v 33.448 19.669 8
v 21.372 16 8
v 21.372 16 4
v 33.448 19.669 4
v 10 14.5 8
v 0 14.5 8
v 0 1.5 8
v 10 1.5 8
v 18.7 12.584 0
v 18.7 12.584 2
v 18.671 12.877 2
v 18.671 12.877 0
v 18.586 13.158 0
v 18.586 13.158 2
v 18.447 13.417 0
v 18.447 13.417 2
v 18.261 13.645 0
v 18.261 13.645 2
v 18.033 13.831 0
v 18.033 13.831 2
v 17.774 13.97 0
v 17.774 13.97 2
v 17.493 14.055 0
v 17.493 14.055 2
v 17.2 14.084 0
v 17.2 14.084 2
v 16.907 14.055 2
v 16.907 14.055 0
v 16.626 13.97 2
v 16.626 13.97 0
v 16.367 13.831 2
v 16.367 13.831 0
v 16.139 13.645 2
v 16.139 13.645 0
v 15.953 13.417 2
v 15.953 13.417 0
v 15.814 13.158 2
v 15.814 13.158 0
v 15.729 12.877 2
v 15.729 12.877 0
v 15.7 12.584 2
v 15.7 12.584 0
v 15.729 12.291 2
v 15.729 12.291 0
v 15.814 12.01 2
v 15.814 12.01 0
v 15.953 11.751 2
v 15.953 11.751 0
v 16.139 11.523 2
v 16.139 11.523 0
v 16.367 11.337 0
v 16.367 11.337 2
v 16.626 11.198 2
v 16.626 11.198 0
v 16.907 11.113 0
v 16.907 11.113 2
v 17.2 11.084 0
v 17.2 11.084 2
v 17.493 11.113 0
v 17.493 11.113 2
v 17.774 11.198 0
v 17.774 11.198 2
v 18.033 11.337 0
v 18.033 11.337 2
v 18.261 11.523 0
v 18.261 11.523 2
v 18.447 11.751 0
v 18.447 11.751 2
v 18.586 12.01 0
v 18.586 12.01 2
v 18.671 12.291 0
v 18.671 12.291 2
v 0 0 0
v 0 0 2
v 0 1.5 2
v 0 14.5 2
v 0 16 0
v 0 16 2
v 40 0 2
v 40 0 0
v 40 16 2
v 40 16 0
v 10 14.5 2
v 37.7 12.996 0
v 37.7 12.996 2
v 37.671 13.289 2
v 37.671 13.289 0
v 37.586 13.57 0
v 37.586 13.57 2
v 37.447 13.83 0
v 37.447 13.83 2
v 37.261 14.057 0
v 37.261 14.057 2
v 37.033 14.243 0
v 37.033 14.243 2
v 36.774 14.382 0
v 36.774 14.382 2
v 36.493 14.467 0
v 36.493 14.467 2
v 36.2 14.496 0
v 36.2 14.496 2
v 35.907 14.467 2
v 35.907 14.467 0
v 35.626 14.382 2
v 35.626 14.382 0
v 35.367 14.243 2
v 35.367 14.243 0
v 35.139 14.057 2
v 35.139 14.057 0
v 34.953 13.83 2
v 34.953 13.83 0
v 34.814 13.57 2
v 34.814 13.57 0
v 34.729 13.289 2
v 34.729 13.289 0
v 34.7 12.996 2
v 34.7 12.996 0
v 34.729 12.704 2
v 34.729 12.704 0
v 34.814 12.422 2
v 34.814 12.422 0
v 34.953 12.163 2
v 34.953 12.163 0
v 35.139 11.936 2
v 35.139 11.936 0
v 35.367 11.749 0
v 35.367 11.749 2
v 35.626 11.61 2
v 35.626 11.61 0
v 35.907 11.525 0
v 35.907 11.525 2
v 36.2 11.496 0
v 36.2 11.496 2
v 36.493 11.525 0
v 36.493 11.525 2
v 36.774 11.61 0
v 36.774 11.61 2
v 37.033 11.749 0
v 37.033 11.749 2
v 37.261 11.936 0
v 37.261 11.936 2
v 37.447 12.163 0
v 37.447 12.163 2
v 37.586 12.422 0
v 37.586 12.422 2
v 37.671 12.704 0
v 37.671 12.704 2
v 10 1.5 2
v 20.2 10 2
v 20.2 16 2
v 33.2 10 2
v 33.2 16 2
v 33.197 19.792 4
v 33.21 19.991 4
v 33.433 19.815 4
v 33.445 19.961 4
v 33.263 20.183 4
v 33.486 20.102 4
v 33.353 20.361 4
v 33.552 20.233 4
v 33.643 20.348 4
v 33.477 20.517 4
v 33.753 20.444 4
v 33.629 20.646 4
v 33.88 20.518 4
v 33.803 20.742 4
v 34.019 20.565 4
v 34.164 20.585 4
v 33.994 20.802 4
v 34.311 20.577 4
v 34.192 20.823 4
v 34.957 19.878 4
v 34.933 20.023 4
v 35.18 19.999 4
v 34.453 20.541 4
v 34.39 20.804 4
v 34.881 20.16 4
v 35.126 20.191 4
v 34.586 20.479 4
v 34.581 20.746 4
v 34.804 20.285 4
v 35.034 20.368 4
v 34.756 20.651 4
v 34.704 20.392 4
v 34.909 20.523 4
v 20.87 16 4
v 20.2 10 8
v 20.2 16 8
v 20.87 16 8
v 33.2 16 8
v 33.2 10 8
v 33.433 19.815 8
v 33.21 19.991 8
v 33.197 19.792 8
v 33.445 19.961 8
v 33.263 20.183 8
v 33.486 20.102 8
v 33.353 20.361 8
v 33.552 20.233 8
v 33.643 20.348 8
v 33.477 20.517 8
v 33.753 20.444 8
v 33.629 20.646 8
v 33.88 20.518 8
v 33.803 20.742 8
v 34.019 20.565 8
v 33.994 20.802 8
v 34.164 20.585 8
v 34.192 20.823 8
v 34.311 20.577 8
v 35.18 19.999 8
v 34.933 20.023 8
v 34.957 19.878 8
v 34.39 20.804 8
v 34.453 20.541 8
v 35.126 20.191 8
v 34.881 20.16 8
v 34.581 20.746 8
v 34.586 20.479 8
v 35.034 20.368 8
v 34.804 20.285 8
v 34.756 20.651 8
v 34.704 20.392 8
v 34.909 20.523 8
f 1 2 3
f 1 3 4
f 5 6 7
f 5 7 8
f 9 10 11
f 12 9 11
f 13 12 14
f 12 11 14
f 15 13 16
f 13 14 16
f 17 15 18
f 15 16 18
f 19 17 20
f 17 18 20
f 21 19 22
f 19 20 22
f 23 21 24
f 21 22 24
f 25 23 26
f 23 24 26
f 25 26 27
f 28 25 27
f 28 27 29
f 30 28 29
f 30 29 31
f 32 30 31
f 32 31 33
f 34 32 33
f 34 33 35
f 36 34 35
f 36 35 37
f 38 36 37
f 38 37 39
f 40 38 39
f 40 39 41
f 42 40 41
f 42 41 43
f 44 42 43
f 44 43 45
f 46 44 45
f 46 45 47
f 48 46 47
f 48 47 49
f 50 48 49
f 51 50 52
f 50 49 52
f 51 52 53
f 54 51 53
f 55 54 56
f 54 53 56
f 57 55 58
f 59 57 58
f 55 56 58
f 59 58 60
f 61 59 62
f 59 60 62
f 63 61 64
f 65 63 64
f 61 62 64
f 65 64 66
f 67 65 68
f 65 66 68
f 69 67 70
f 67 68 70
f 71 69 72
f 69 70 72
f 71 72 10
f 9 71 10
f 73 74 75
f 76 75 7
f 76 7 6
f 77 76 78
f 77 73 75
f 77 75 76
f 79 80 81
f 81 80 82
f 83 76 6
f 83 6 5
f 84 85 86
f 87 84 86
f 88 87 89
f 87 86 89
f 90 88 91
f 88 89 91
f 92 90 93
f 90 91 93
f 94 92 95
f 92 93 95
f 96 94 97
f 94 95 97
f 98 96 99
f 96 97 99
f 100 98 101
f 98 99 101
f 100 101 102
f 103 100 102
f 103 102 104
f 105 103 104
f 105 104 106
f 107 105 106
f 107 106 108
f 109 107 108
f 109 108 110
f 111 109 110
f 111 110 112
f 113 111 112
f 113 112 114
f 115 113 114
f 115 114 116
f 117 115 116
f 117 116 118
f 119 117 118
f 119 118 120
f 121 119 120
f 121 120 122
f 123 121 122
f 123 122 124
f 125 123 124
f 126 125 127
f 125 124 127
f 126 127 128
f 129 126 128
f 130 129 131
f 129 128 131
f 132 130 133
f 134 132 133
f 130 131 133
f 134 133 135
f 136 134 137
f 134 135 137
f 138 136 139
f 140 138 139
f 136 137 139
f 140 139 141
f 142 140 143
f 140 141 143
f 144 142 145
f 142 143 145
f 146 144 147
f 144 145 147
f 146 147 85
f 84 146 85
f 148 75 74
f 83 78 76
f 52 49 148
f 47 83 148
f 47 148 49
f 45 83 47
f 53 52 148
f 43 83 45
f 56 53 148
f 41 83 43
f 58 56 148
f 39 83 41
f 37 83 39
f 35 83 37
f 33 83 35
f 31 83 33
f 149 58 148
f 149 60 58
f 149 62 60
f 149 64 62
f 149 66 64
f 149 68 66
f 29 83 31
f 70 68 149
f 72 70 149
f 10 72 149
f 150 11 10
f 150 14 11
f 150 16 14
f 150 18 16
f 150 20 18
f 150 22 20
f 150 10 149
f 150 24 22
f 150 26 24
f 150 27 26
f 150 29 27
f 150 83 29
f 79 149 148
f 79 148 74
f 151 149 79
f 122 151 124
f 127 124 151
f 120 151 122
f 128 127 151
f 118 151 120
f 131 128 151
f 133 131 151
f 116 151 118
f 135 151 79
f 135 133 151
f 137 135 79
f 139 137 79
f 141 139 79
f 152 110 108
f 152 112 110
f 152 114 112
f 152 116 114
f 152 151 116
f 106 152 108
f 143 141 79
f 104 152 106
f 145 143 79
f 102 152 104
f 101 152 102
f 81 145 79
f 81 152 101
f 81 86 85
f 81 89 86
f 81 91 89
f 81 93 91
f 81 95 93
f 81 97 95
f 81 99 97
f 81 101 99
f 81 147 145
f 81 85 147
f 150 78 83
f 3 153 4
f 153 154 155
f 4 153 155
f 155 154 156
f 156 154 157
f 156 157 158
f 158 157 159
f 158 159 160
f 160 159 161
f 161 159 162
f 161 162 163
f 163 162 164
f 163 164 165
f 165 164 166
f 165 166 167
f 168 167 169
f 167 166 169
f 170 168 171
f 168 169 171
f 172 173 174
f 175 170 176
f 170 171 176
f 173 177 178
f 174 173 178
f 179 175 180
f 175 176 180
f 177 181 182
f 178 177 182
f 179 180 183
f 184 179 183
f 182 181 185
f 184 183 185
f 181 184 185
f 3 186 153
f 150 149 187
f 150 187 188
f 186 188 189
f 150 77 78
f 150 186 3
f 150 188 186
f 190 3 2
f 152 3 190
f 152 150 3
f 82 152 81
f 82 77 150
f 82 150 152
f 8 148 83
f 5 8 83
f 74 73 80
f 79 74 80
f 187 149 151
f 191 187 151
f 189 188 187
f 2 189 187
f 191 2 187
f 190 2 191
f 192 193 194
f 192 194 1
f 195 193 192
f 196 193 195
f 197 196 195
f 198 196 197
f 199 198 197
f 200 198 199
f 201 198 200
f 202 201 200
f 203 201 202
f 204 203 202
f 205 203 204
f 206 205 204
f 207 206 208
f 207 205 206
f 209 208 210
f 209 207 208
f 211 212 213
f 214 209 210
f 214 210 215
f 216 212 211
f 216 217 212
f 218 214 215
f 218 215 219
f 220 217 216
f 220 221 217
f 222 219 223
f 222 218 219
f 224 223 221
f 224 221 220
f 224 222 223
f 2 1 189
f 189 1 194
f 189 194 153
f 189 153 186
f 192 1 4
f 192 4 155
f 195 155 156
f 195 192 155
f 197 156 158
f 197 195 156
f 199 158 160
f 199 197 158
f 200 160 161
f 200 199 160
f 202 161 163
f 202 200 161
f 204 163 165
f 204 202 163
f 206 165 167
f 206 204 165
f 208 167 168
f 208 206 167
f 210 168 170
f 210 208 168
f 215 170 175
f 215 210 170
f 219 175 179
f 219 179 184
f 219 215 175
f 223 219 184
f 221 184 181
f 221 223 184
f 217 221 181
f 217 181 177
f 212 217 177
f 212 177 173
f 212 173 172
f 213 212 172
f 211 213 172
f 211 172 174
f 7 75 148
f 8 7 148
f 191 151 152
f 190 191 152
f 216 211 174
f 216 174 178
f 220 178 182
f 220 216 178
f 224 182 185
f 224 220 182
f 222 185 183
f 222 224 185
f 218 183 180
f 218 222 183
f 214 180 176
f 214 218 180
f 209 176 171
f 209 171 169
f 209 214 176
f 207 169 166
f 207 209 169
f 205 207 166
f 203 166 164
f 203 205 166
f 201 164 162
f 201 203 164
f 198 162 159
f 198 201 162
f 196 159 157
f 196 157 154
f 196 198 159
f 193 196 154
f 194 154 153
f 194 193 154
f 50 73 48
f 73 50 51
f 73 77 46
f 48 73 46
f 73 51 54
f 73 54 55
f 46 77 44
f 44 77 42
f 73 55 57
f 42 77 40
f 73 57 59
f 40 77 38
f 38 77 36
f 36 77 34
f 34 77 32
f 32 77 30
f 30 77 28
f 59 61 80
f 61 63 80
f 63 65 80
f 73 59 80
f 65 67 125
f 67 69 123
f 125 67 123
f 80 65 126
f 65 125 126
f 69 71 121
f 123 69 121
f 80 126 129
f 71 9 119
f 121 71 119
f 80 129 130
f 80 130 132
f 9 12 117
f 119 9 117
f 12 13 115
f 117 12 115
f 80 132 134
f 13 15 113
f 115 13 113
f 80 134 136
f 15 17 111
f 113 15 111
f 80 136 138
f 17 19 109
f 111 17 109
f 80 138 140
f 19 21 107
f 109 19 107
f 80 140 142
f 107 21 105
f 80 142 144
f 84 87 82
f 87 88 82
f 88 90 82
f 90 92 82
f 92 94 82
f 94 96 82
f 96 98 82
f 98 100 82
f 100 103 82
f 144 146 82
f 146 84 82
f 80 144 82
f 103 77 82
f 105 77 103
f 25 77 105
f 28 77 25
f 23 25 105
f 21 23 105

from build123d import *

# Parameters (mm, degrees)
F0_W     = 40
F0_H     = 16
F1_DEPTH = 2
F2_W     = 10
F2_H     = 13
F2_W_2   = 13
F2_H_2   = 6
F3_DEPTH = 6
F4_R     = 1.5
F5_DEPTH = 25
F7_DEPTH = 4


with BuildPart() as f1:
    # F0 (on Top) → F1 (new body)
    with BuildSketch(Plane.XY):
        with Locations((20, 8)):
            Rectangle(F0_W, F0_H)
    extrude(amount=F1_DEPTH)

    # F2 (on face) → F3 (join)
    with BuildSketch(Plane.XY.offset(2)):
        with Locations((5, 8)):
            Rectangle(F2_W, F2_H)
        with Locations((26.7, 13)):
            Rectangle(F2_W_2, F2_H_2)
    extrude(amount=F3_DEPTH)

    # F4 (on face) → F5 (cut)
    with BuildSketch(Plane.XY.offset(2)):
        with Locations((17.2, 12.58387)):
            Circle(F4_R)
        with Locations((36.2, 12.996209)):
            Circle(F4_R)
    extrude(amount=-F5_DEPTH, mode=Mode.SUBTRACT)

    # F6 (on face) → F7 (join)
    with BuildSketch(Plane.XY.offset(8)):
        with BuildLine():
            Line((33.196565, 19.791735), (20.869566, 16))
            Line((20.869566, 16), (21.372473, 16))
            Line((21.372473, 16), (33.448326, 19.669136))
            ThreePointArc((33.448326, 19.669136), (34.091376, 20.578656), (34.9574, 19.878127))
            Line((34.9574, 19.878127), (35.180375, 19.999125))
            ThreePointArc((35.180375, 19.999125), (34.092116, 20.817116), (33.196565, 19.791735))
        make_face()
    extrude(amount=-F7_DEPTH)


solid = f1.part
